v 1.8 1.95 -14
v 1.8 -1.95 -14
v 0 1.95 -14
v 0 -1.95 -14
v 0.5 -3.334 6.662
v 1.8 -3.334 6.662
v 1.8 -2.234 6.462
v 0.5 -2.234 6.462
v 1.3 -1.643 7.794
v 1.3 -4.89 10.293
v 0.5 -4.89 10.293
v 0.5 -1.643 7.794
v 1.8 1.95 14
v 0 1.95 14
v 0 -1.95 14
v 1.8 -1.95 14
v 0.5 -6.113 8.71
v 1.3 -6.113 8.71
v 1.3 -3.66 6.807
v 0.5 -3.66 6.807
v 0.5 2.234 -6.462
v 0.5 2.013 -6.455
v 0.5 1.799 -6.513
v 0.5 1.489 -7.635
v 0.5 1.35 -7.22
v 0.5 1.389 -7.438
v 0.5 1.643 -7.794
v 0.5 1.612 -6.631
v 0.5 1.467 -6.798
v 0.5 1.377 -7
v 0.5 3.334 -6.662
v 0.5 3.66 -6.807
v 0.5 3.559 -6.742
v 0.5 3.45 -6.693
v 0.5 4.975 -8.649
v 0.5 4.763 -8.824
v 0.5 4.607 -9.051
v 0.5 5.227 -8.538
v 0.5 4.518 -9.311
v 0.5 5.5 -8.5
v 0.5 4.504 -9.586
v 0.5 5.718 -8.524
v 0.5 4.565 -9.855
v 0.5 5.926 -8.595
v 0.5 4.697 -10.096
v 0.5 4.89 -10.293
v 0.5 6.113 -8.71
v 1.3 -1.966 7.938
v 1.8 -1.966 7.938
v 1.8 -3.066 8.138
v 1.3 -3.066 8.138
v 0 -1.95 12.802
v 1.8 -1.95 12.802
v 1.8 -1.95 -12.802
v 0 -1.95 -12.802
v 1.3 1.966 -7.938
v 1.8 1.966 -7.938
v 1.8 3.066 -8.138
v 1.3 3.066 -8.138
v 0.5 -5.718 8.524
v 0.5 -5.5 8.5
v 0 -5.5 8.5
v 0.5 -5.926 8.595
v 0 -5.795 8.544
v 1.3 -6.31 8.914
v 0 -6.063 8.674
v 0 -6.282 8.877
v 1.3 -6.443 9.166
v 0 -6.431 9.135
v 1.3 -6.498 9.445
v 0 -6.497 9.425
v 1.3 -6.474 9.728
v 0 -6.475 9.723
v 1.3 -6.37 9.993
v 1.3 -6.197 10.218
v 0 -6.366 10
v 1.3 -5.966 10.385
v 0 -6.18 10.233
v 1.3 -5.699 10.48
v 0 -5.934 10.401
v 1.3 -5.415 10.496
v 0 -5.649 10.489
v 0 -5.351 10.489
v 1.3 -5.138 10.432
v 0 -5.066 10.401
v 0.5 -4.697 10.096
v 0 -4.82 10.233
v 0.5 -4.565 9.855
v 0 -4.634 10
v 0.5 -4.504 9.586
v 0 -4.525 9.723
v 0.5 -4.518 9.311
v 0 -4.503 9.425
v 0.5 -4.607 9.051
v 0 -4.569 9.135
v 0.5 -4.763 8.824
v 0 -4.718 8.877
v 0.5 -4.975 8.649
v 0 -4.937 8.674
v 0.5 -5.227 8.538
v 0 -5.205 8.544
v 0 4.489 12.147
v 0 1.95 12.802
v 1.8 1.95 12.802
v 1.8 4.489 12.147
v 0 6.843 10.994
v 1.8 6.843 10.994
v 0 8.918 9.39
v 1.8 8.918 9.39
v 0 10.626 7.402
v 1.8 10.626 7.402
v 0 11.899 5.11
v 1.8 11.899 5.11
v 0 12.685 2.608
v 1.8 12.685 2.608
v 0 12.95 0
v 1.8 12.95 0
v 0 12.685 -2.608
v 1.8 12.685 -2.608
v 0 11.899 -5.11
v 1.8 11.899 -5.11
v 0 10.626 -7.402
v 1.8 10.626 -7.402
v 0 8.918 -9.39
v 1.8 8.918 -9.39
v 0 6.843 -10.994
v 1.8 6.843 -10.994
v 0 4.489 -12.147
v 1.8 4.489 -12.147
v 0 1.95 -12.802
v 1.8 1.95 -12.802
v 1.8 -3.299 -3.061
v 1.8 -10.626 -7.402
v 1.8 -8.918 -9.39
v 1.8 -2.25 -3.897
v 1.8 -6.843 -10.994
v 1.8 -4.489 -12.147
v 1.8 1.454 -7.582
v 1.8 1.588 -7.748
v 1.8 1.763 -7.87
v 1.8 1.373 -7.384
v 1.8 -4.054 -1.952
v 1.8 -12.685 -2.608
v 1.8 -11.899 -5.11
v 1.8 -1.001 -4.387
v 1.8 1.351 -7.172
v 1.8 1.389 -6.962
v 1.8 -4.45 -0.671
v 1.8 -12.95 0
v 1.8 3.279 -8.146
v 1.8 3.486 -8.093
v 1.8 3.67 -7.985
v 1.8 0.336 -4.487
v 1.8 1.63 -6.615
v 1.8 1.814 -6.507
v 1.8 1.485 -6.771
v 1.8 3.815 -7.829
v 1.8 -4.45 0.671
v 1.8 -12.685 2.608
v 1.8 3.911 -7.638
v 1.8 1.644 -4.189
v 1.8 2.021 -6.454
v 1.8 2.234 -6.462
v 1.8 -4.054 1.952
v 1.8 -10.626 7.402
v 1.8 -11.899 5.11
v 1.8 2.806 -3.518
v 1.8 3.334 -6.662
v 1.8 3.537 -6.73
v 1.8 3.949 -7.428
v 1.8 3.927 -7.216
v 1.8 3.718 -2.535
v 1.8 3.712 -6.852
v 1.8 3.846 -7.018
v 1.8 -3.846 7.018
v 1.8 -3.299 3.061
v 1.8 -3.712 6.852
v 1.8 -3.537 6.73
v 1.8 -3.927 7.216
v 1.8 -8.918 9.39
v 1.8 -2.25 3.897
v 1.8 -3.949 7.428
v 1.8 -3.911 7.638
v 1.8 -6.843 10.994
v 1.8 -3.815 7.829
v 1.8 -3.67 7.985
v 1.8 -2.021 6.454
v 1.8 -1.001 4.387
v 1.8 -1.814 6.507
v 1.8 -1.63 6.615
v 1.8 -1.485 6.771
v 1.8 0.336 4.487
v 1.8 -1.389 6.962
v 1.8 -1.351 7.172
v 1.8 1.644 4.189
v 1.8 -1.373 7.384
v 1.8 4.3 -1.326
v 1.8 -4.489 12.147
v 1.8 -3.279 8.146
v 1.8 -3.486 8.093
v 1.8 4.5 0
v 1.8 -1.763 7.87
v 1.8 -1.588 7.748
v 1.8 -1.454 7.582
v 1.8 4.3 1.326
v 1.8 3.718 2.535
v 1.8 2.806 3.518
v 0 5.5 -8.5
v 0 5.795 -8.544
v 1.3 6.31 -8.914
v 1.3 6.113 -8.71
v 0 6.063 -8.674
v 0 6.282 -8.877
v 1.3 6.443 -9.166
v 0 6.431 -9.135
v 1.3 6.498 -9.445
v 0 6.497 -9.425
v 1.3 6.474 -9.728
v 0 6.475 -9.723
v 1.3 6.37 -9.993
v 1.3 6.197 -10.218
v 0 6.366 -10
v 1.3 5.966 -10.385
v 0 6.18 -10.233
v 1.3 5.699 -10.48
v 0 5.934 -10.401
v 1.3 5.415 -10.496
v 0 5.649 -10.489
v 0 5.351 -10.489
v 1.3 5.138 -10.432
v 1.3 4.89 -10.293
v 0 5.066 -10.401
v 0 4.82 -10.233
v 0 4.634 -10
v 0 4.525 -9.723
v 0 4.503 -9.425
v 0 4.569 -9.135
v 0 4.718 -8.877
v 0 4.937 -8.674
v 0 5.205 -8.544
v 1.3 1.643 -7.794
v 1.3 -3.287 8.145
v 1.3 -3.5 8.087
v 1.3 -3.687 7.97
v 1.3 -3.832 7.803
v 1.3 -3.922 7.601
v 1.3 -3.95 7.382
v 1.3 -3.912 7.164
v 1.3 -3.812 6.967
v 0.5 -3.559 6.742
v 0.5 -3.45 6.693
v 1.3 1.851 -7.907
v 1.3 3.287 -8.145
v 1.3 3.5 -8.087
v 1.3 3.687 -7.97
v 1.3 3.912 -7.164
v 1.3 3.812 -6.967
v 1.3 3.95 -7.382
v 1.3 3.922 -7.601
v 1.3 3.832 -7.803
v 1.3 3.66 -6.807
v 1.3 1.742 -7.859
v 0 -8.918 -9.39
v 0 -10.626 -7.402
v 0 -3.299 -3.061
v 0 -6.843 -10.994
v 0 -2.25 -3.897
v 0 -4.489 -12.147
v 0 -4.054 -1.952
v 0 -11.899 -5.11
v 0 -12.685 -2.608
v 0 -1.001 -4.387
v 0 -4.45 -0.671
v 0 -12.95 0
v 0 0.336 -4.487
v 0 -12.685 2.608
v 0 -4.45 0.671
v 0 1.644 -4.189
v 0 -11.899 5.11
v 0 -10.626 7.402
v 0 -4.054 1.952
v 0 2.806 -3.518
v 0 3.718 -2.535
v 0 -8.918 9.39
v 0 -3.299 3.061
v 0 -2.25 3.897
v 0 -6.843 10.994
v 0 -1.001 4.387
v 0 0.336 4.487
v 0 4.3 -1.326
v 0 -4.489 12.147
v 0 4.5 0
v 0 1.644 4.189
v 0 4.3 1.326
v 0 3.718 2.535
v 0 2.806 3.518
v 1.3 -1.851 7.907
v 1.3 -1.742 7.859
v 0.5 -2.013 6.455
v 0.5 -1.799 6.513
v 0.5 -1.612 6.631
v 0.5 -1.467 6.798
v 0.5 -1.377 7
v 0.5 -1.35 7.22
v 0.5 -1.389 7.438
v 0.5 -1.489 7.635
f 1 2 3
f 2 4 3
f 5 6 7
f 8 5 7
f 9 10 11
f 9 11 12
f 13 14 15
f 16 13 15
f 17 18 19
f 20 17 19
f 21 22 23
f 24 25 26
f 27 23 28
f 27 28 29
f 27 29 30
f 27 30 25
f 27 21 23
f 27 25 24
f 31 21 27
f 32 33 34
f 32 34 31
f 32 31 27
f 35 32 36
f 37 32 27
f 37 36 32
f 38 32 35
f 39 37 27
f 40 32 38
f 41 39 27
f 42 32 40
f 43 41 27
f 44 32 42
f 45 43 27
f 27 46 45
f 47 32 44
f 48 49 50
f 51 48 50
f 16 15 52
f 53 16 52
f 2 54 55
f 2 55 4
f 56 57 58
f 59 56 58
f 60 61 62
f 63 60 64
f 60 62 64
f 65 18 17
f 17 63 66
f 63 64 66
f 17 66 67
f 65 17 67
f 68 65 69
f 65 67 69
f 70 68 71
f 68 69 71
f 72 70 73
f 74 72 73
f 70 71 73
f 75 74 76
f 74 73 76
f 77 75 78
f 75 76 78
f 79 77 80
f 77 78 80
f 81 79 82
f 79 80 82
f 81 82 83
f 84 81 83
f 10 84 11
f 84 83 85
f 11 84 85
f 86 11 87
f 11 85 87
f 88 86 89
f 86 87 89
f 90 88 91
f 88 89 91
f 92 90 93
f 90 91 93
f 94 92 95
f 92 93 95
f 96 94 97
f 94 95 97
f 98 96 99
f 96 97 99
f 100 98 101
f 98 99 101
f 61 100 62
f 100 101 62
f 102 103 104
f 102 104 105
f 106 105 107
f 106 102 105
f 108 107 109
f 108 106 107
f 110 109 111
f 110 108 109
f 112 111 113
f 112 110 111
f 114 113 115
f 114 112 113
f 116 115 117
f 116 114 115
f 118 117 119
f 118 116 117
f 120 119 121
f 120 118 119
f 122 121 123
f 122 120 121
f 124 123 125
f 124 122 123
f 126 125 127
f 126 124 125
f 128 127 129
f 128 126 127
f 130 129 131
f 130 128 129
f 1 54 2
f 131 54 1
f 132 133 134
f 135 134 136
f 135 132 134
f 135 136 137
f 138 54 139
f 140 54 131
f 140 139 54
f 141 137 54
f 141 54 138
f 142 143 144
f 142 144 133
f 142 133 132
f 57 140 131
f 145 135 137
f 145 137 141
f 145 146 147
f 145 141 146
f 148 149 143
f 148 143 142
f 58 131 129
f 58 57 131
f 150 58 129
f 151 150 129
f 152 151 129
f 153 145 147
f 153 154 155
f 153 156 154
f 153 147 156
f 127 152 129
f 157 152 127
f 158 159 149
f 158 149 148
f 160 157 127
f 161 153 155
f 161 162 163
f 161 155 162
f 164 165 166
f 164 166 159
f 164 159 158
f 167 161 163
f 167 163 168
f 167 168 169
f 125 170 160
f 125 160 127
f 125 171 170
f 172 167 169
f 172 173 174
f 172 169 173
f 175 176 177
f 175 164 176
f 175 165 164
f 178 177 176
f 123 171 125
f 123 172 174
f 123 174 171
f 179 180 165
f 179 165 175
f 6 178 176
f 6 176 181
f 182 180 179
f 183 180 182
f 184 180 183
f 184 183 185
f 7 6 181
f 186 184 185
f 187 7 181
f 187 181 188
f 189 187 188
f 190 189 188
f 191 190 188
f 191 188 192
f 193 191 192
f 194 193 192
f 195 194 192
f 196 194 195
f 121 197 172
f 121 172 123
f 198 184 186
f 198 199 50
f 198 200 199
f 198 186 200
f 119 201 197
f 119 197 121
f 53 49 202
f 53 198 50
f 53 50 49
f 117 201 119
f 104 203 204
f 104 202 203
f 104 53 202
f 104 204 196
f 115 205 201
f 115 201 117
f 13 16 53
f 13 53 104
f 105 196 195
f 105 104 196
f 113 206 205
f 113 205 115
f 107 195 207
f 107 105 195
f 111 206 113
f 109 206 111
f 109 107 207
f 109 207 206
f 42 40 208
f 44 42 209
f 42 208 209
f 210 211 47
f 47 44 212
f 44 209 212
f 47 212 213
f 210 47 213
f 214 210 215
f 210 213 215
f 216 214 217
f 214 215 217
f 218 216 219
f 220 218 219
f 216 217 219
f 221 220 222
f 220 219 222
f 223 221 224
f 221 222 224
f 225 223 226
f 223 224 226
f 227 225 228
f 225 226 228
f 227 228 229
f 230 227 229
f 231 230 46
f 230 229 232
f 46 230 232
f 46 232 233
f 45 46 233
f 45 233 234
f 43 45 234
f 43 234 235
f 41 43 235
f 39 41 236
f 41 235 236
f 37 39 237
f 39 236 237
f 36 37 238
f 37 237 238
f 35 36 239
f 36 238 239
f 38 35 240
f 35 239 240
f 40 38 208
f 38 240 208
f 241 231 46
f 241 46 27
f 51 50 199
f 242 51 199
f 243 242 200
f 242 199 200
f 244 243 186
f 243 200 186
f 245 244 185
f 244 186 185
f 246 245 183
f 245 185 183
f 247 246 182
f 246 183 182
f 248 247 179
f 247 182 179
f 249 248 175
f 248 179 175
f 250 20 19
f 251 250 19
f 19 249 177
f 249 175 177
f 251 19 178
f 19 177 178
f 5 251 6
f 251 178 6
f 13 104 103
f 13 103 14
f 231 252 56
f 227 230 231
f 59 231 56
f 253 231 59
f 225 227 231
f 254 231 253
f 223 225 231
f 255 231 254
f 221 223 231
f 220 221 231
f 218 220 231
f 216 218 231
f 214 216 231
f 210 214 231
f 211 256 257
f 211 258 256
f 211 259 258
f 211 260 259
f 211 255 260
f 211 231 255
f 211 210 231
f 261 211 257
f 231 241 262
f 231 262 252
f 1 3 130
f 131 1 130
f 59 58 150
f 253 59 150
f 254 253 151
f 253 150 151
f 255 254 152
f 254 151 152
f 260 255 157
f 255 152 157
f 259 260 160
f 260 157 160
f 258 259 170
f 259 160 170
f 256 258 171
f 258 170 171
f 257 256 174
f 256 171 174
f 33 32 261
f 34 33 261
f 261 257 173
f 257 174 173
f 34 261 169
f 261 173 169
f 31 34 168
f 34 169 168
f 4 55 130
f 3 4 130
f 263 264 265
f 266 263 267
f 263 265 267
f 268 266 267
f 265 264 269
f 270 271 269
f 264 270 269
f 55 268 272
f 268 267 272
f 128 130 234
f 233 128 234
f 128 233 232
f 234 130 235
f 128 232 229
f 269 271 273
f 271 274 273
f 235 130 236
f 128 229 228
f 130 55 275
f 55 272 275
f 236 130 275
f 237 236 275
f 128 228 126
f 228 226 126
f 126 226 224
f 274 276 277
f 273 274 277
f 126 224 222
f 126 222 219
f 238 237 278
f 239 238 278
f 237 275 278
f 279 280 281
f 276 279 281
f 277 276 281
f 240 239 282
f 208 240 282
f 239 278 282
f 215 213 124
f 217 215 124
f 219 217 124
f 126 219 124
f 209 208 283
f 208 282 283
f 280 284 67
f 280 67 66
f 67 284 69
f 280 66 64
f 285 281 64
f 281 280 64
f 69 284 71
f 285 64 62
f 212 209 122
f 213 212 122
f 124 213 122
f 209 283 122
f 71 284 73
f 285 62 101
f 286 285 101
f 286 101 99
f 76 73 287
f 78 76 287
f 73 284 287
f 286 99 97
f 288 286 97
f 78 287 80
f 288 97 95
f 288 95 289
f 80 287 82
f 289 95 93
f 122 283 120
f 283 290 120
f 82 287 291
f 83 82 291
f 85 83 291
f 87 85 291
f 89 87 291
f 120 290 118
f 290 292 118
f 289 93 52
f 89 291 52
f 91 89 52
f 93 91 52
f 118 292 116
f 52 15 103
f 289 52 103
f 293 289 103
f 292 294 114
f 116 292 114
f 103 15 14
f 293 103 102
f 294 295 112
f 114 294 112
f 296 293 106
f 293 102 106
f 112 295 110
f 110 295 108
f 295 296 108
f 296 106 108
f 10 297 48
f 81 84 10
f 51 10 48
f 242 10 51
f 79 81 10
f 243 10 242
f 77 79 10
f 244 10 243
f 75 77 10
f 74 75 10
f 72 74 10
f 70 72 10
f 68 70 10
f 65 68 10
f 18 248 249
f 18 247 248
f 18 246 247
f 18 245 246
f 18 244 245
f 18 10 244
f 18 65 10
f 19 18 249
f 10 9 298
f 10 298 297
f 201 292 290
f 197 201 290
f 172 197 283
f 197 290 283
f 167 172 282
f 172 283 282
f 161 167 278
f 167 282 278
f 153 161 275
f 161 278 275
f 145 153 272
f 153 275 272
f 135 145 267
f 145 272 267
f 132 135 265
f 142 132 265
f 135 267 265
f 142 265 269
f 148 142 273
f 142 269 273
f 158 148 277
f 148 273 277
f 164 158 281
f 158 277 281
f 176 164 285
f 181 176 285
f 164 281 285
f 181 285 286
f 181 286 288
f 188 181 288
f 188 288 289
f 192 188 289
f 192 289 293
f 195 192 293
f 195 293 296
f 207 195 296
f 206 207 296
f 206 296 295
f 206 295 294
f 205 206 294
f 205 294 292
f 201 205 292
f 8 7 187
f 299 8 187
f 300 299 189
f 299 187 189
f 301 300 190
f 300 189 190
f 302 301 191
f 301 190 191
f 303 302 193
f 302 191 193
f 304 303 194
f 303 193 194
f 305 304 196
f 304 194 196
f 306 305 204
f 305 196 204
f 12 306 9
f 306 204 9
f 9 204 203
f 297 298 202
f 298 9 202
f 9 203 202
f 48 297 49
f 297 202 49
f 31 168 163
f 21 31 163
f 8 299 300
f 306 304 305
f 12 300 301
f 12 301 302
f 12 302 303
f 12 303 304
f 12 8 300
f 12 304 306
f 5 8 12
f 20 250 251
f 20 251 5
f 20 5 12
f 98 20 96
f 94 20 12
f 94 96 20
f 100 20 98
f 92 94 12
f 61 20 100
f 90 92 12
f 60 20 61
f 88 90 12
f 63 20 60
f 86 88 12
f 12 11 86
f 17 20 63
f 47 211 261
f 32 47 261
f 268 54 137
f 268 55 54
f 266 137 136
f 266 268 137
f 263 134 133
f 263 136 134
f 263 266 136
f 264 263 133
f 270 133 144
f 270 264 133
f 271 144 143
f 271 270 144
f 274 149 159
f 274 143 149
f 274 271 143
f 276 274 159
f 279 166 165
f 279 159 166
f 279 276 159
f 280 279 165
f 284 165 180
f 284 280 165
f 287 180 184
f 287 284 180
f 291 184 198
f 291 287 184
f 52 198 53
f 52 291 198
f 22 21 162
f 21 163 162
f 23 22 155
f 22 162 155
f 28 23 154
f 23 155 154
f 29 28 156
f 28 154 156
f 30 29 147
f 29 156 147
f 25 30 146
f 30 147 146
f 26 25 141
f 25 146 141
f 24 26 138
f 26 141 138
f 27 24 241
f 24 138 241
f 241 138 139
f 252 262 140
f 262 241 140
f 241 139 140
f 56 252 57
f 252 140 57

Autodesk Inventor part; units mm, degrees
ref_plane "YZ Plane" through (0, 0, 0) normal (1, 0, 0) x (0, 1, 0)
ref_plane "XZ Plane" through (0, 0, 0) normal (0, 1, 0) x (-1, 0, 0)
ref_plane "XY Plane" through (0, 0, 0) normal (0, 0, 1) x (1, 0, 0)
sketch "Sketch1" plane through (0, 0, 0) normal (1, 0, 0) x (0, 1, 0)
  circle A0 centre (0, 0) radius 12.95
  line L0 (-1.95, -14) -> (1.95, -14)
  line L1 (1.95, -14) -> (1.95, 14)
  line L2 (1.95, 14) -> (-1.95, 14)
  line L3 (-1.95, 14) -> (-1.95, -14)
  line L4 (-1.95, -14) -> (1.95, 14) construction
  line L5 (1.95, -14) -> (-1.95, 14) construction
  circle A1 centre (0, 0) radius 4.5
  point P0 (1.95, -12.8023)
  point P1 (1.95, 12.8023)
  point P2 (-1.95, 12.8023)
  point P3 (-1.95, -12.8023)
  dimension "d0" = 3.9
  dimension "d1" = 25.9
  dimension "d2" = 28
  dimension "d5" = 9
extrude "Extrusion1" add sketch "Sketch1" along normal blind 1.8 contours A0 L1 A1 | L1 A1 L3 A0 | A0 L3 L2 L1 | L1 L0 L3 A0 | A0 L3 A1 L1 | L3 A1 A0
sketch "Sketch2" plane through (1.8, 0, 0) normal (1, 0, 0) x (0, 0, -1)
  line L0 (7.4, 3.2) -> (7.2, 2.1) construction
  line L1 (6.6621, 3.3342) -> (6.4621, 2.2342)
  line L2 (7.9379, 1.9658) -> (8.1379, 3.0658)
  arc A0 (8.1379, 3.0658) -> (6.6621, 3.3342) centre (7.4, 3.2) ccw
  arc A1 (6.4621, 2.2342) -> (7.9379, 1.9658) centre (7.2, 2.1) ccw
  point P0 (0, 0)
  point P1 (7.3, 2.65)
  dimension "d6" = 0.75
  dimension "d9" = 7.2
  dimension "d10" = 2.1
  dimension "d11" = 7.4
  dimension "d12" = 3.2
extrude "Extrusion2" cut sketch "Sketch2" against normal blind 1.3
sketch "Sketch3" plane through (0, 0, 0) normal (-1, 0, 0) x (0, 0, 1)
  arc A0 (-7.9379, 1.9658) -> (-6.4621, 2.2342) centre (-7.2, 2.1) ccw construction
  line L0 (-8.1379, 3.0658) -> (-7.9379, 1.9658) construction
  arc A1 (-6.6621, 3.3342) -> (-8.1379, 3.0658) centre (-7.4, 3.2) ccw construction
  line L1 (-6.4621, 2.2342) -> (-6.6621, 3.3342) construction
  circle A2 centre (0, 0) radius 9 construction
  line L2 (-7.4, 3.2) -> (-7.2, 2.1) construction
  circle A3 centre (-9.5, 5.5) radius 1
  dimension "d13" = 18
  dimension "d17" = 9.5
  dimension "d18" = 5.5
  dimension "d19" = 2
extrude "Extrusion3" cut sketch "Sketch3" against normal blind 1.3
sketch "Sketch4" plane through (1.3, 5.5, -9.5) normal (-1, 0, 0) x (0, 0, 1)
  circle A0 centre (0, 0) radius 1 projected
  arc A1 (1.5621, -3.5342) -> (3.0379, -3.2658) centre (2.3, -3.4) ccw projected
  line L0 (1.3621, -2.4342) -> (1.5621, -3.5342) projected
  arc A2 (2.8379, -2.1658) -> (1.3621, -2.4342) centre (2.1, -2.3) ccw projected
  line L1 (3.0379, -3.2658) -> (2.8379, -2.1658) projected
  line L2 (0.7902, 0.6128) -> (2.6927, -1.8404)
  arc A3 (2.8379, -2.1658) -> (1.3621, -2.4342) centre (2.1, -2.3) ccw projected
  circle A4 centre (0, 0) radius 1 projected
  line L3 (-0.7926, -0.6097) -> (1.7055, -3.8573)
  arc A5 (1.5621, -3.5342) -> (3.0379, -3.2658) centre (2.3, -3.4) ccw projected
  circle A6 centre (0, 0) radius 1 projected
  point P0 (9.5, -5.5)
  point P1 (2.6927, -1.8404)
  point P2 (-0.7926, -0.6097)
extrude "Extrusion4" cut sketch "Sketch4" along normal up to surface (0.8 mm away) contours A0 L2 A2 L0 A1 L3
pattern_circular "Circular Pattern1" count 2 over 360 about axis through (0, 0, 0) along (1, 0, 0) of "Extrusion2", "Extrusion3", "Extrusion4"
properties part number "ValvePlate"
